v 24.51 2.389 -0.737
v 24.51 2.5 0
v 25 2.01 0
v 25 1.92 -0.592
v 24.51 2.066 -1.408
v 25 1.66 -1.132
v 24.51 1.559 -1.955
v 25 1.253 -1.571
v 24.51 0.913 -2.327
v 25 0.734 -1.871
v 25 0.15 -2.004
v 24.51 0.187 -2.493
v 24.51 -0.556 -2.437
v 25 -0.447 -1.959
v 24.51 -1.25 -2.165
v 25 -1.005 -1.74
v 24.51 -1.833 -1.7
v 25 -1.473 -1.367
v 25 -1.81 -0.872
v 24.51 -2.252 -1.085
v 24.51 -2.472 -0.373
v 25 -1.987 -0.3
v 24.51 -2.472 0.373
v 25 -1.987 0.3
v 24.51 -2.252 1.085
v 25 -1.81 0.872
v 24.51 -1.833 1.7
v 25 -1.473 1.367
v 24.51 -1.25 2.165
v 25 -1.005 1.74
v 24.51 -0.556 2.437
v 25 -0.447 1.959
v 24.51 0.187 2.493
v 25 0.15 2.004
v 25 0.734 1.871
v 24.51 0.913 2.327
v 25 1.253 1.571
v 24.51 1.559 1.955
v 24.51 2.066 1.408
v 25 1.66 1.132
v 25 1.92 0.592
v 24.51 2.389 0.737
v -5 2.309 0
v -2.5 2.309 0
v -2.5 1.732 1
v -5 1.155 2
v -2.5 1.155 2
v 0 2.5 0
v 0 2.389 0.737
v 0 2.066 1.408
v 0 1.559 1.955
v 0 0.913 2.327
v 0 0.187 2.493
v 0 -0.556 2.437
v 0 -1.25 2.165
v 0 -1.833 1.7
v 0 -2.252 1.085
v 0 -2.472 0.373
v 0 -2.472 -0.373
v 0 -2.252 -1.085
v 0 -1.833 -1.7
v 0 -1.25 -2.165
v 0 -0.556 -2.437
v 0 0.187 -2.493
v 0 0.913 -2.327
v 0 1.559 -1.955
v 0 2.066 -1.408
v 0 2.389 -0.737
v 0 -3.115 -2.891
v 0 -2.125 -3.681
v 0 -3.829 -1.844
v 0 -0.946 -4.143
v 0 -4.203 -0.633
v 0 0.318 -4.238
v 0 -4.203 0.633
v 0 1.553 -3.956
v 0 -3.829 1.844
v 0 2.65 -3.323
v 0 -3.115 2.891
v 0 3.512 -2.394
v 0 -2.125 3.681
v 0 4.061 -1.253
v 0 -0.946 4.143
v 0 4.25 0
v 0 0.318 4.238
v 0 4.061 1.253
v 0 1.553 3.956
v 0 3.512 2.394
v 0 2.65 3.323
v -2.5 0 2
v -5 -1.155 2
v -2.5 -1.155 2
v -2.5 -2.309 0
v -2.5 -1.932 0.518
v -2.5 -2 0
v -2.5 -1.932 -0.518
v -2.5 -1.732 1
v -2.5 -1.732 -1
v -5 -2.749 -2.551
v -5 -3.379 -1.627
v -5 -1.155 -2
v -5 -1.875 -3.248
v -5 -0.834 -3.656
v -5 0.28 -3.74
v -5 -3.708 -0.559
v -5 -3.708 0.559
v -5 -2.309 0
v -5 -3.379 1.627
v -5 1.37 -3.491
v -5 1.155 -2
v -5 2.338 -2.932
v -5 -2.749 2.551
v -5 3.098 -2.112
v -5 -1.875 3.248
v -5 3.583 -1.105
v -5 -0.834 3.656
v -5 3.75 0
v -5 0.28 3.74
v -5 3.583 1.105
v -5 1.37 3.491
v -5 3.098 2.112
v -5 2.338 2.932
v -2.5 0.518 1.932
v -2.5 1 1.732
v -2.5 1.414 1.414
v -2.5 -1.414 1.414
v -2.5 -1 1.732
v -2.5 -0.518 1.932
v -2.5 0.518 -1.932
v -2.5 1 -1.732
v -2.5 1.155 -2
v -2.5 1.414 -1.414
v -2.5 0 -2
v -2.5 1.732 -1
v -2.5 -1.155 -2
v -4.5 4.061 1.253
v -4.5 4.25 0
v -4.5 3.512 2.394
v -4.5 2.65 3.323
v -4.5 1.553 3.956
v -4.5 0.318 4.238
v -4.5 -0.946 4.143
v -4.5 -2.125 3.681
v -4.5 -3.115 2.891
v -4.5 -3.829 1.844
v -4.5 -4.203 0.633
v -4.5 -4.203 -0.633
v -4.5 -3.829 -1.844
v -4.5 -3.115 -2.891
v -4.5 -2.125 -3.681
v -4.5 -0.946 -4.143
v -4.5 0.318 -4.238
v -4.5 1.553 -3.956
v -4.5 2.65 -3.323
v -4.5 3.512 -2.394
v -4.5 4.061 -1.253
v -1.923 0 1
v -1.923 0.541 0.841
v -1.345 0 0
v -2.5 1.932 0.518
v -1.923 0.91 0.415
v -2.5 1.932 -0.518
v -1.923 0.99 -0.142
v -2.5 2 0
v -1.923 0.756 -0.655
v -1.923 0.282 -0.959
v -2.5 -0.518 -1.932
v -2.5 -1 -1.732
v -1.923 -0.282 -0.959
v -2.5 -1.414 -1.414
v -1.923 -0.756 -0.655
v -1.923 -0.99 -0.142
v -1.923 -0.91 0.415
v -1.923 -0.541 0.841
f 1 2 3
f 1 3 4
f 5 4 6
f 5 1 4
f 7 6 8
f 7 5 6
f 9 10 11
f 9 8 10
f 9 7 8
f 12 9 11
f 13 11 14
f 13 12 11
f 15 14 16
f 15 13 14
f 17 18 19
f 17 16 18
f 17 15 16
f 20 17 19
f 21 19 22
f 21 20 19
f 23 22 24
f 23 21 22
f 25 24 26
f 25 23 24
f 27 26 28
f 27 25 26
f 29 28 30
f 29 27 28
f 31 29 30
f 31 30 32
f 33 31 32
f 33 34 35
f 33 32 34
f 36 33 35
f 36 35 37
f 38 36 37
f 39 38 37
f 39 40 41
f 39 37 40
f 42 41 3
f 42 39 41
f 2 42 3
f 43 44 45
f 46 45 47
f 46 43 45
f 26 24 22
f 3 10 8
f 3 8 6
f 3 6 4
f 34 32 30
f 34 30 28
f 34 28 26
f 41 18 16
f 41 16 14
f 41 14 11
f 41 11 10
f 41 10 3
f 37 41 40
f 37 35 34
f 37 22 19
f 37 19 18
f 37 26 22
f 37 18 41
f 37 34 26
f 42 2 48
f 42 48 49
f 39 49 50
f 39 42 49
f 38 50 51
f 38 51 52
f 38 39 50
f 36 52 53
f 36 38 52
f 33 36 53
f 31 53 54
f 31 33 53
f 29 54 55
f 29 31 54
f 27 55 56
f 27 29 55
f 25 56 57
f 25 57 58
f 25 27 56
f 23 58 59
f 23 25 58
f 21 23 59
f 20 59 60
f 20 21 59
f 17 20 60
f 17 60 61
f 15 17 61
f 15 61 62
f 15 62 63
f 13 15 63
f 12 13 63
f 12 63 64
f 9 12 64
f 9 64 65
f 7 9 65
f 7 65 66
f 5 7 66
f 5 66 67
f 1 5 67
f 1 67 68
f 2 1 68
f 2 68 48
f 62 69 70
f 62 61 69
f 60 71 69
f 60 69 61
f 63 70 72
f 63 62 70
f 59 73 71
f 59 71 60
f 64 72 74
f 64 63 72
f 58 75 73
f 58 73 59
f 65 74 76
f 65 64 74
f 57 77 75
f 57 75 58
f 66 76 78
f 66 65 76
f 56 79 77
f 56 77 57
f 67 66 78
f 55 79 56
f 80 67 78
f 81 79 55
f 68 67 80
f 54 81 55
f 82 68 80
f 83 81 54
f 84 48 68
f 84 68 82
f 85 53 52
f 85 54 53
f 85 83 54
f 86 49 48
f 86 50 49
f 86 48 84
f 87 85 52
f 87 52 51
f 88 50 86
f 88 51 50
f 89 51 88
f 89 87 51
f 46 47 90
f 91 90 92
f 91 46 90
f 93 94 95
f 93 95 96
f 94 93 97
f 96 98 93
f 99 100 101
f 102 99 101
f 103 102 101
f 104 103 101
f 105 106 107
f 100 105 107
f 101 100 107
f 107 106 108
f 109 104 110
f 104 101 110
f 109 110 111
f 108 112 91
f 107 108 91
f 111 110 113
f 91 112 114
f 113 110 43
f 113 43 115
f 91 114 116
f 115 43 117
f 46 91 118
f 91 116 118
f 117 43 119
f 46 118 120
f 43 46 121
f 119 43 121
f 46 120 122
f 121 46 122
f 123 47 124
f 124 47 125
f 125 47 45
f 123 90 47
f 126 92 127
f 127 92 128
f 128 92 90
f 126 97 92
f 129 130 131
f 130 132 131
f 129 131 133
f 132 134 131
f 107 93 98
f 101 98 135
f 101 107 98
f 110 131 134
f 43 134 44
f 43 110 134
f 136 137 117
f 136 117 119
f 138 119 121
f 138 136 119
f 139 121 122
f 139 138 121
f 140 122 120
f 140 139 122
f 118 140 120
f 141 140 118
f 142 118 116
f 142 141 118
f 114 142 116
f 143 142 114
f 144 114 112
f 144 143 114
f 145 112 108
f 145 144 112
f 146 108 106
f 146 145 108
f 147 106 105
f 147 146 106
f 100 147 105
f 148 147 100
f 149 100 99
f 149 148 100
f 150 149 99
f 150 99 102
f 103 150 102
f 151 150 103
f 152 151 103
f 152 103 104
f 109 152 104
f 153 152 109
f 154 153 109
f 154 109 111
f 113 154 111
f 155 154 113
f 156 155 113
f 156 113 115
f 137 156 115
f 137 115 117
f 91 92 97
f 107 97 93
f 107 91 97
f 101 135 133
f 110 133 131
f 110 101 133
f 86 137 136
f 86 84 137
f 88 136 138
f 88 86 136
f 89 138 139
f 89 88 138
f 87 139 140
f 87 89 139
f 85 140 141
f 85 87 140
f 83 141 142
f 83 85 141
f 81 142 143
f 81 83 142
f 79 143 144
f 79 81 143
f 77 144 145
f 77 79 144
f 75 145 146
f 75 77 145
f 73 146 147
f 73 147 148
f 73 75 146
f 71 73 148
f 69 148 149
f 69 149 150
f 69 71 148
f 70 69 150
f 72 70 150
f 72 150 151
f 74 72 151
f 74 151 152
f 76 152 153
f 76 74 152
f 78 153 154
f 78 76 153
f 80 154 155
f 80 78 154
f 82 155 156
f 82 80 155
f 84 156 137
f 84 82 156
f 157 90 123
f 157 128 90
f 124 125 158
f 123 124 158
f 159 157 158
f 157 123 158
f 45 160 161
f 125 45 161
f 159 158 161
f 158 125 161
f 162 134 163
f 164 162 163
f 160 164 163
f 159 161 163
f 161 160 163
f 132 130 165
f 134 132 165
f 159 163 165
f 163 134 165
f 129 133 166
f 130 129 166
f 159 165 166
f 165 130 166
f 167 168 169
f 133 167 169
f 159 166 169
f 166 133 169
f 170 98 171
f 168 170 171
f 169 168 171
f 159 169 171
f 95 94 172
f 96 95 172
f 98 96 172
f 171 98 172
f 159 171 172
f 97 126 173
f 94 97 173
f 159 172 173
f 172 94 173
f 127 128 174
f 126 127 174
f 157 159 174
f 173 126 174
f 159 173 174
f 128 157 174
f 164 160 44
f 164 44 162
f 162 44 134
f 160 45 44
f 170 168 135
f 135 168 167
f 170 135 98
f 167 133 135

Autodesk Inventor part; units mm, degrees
sketch "Sketch_1" plane through (0, 0, 0) normal (0, 0, 1) x (1, 0, 0)
  line L0 (25, 0) -> (-5, 0)
  line L1 (-5, 0) -> (-5, 3.75)
  line L2 (-5, 3.75) -> (-4.5, 4.25)
  line L3 (-4.5, 4.25) -> (0, 4.25)
  line L4 (0, 4.25) -> (0, 2.5)
  line L5 (0, 2.5) -> (24.5095, 2.5)
  line L6 (24.5095, 2.5) -> (25, 2.0095)
  line L7 (25, 2.0095) -> (25, 0)
  line L8 (25, 0) -> (-5, 0)
revolve "Revolution1" add sketch "Sketch_1" angle 360 about axis through (25, 0, 0) along (1, 0, 0)
thread "Thread1" size "M5x0.8" class "6g" standard "ISO Metric profile" length 24.2 offset 0.8
sketch "Sketch2" plane through (-5, 0, 0) normal (-1, 0, 0) x (0, 0, 1)
  point P0 (0, 0)
hole "Hole1" at (-5, 0, 0) direction (1, 0, 0) diameter 4 depth 2.5 tip angle 120
sketch "Sketch_3" plane through (-5, 0, 0) normal (1, 0, 0) x (0, 0, -1)
  line L0 (-2, -1.1547) -> (0, -2.3094)
  line L1 (0, -2.3094) -> (2, -1.1547)
  line L2 (2, -1.1547) -> (2, 1.1547)
  line L3 (2, 1.1547) -> (0, 2.3094)
  line L4 (0, 2.3094) -> (-2, 1.1547)
  line L5 (-2, 1.1547) -> (-2, -1.1547)
extrude "Extrusion1" cut sketch "Sketch_3" along normal blind 2.5
ref_plane "bolt_XY" through (25, 0, 0) normal (1, 0, 0) x (0, 0, -1)
ref_plane "bolt_YZ" through (25, 0, 0) normal (0, 0, -1) x (0, 1, 0)
ref_plane "bolt_ZX" through (25, 0, 0) normal (0, 1, 0) x (1, 0, 0)
ref_plane "nut_XY" through (0, 0, 0) normal (1, 0, 0) x (0, 0, -1)
ref_plane "nut_YZ" through (0, 0, 0) normal (0, 0, -1) x (0, 1, 0)
ref_plane "nut_ZX" through (0, 0, 0) normal (0, 1, 0) x (1, 0, 0)
properties part number "CBE5-25"
